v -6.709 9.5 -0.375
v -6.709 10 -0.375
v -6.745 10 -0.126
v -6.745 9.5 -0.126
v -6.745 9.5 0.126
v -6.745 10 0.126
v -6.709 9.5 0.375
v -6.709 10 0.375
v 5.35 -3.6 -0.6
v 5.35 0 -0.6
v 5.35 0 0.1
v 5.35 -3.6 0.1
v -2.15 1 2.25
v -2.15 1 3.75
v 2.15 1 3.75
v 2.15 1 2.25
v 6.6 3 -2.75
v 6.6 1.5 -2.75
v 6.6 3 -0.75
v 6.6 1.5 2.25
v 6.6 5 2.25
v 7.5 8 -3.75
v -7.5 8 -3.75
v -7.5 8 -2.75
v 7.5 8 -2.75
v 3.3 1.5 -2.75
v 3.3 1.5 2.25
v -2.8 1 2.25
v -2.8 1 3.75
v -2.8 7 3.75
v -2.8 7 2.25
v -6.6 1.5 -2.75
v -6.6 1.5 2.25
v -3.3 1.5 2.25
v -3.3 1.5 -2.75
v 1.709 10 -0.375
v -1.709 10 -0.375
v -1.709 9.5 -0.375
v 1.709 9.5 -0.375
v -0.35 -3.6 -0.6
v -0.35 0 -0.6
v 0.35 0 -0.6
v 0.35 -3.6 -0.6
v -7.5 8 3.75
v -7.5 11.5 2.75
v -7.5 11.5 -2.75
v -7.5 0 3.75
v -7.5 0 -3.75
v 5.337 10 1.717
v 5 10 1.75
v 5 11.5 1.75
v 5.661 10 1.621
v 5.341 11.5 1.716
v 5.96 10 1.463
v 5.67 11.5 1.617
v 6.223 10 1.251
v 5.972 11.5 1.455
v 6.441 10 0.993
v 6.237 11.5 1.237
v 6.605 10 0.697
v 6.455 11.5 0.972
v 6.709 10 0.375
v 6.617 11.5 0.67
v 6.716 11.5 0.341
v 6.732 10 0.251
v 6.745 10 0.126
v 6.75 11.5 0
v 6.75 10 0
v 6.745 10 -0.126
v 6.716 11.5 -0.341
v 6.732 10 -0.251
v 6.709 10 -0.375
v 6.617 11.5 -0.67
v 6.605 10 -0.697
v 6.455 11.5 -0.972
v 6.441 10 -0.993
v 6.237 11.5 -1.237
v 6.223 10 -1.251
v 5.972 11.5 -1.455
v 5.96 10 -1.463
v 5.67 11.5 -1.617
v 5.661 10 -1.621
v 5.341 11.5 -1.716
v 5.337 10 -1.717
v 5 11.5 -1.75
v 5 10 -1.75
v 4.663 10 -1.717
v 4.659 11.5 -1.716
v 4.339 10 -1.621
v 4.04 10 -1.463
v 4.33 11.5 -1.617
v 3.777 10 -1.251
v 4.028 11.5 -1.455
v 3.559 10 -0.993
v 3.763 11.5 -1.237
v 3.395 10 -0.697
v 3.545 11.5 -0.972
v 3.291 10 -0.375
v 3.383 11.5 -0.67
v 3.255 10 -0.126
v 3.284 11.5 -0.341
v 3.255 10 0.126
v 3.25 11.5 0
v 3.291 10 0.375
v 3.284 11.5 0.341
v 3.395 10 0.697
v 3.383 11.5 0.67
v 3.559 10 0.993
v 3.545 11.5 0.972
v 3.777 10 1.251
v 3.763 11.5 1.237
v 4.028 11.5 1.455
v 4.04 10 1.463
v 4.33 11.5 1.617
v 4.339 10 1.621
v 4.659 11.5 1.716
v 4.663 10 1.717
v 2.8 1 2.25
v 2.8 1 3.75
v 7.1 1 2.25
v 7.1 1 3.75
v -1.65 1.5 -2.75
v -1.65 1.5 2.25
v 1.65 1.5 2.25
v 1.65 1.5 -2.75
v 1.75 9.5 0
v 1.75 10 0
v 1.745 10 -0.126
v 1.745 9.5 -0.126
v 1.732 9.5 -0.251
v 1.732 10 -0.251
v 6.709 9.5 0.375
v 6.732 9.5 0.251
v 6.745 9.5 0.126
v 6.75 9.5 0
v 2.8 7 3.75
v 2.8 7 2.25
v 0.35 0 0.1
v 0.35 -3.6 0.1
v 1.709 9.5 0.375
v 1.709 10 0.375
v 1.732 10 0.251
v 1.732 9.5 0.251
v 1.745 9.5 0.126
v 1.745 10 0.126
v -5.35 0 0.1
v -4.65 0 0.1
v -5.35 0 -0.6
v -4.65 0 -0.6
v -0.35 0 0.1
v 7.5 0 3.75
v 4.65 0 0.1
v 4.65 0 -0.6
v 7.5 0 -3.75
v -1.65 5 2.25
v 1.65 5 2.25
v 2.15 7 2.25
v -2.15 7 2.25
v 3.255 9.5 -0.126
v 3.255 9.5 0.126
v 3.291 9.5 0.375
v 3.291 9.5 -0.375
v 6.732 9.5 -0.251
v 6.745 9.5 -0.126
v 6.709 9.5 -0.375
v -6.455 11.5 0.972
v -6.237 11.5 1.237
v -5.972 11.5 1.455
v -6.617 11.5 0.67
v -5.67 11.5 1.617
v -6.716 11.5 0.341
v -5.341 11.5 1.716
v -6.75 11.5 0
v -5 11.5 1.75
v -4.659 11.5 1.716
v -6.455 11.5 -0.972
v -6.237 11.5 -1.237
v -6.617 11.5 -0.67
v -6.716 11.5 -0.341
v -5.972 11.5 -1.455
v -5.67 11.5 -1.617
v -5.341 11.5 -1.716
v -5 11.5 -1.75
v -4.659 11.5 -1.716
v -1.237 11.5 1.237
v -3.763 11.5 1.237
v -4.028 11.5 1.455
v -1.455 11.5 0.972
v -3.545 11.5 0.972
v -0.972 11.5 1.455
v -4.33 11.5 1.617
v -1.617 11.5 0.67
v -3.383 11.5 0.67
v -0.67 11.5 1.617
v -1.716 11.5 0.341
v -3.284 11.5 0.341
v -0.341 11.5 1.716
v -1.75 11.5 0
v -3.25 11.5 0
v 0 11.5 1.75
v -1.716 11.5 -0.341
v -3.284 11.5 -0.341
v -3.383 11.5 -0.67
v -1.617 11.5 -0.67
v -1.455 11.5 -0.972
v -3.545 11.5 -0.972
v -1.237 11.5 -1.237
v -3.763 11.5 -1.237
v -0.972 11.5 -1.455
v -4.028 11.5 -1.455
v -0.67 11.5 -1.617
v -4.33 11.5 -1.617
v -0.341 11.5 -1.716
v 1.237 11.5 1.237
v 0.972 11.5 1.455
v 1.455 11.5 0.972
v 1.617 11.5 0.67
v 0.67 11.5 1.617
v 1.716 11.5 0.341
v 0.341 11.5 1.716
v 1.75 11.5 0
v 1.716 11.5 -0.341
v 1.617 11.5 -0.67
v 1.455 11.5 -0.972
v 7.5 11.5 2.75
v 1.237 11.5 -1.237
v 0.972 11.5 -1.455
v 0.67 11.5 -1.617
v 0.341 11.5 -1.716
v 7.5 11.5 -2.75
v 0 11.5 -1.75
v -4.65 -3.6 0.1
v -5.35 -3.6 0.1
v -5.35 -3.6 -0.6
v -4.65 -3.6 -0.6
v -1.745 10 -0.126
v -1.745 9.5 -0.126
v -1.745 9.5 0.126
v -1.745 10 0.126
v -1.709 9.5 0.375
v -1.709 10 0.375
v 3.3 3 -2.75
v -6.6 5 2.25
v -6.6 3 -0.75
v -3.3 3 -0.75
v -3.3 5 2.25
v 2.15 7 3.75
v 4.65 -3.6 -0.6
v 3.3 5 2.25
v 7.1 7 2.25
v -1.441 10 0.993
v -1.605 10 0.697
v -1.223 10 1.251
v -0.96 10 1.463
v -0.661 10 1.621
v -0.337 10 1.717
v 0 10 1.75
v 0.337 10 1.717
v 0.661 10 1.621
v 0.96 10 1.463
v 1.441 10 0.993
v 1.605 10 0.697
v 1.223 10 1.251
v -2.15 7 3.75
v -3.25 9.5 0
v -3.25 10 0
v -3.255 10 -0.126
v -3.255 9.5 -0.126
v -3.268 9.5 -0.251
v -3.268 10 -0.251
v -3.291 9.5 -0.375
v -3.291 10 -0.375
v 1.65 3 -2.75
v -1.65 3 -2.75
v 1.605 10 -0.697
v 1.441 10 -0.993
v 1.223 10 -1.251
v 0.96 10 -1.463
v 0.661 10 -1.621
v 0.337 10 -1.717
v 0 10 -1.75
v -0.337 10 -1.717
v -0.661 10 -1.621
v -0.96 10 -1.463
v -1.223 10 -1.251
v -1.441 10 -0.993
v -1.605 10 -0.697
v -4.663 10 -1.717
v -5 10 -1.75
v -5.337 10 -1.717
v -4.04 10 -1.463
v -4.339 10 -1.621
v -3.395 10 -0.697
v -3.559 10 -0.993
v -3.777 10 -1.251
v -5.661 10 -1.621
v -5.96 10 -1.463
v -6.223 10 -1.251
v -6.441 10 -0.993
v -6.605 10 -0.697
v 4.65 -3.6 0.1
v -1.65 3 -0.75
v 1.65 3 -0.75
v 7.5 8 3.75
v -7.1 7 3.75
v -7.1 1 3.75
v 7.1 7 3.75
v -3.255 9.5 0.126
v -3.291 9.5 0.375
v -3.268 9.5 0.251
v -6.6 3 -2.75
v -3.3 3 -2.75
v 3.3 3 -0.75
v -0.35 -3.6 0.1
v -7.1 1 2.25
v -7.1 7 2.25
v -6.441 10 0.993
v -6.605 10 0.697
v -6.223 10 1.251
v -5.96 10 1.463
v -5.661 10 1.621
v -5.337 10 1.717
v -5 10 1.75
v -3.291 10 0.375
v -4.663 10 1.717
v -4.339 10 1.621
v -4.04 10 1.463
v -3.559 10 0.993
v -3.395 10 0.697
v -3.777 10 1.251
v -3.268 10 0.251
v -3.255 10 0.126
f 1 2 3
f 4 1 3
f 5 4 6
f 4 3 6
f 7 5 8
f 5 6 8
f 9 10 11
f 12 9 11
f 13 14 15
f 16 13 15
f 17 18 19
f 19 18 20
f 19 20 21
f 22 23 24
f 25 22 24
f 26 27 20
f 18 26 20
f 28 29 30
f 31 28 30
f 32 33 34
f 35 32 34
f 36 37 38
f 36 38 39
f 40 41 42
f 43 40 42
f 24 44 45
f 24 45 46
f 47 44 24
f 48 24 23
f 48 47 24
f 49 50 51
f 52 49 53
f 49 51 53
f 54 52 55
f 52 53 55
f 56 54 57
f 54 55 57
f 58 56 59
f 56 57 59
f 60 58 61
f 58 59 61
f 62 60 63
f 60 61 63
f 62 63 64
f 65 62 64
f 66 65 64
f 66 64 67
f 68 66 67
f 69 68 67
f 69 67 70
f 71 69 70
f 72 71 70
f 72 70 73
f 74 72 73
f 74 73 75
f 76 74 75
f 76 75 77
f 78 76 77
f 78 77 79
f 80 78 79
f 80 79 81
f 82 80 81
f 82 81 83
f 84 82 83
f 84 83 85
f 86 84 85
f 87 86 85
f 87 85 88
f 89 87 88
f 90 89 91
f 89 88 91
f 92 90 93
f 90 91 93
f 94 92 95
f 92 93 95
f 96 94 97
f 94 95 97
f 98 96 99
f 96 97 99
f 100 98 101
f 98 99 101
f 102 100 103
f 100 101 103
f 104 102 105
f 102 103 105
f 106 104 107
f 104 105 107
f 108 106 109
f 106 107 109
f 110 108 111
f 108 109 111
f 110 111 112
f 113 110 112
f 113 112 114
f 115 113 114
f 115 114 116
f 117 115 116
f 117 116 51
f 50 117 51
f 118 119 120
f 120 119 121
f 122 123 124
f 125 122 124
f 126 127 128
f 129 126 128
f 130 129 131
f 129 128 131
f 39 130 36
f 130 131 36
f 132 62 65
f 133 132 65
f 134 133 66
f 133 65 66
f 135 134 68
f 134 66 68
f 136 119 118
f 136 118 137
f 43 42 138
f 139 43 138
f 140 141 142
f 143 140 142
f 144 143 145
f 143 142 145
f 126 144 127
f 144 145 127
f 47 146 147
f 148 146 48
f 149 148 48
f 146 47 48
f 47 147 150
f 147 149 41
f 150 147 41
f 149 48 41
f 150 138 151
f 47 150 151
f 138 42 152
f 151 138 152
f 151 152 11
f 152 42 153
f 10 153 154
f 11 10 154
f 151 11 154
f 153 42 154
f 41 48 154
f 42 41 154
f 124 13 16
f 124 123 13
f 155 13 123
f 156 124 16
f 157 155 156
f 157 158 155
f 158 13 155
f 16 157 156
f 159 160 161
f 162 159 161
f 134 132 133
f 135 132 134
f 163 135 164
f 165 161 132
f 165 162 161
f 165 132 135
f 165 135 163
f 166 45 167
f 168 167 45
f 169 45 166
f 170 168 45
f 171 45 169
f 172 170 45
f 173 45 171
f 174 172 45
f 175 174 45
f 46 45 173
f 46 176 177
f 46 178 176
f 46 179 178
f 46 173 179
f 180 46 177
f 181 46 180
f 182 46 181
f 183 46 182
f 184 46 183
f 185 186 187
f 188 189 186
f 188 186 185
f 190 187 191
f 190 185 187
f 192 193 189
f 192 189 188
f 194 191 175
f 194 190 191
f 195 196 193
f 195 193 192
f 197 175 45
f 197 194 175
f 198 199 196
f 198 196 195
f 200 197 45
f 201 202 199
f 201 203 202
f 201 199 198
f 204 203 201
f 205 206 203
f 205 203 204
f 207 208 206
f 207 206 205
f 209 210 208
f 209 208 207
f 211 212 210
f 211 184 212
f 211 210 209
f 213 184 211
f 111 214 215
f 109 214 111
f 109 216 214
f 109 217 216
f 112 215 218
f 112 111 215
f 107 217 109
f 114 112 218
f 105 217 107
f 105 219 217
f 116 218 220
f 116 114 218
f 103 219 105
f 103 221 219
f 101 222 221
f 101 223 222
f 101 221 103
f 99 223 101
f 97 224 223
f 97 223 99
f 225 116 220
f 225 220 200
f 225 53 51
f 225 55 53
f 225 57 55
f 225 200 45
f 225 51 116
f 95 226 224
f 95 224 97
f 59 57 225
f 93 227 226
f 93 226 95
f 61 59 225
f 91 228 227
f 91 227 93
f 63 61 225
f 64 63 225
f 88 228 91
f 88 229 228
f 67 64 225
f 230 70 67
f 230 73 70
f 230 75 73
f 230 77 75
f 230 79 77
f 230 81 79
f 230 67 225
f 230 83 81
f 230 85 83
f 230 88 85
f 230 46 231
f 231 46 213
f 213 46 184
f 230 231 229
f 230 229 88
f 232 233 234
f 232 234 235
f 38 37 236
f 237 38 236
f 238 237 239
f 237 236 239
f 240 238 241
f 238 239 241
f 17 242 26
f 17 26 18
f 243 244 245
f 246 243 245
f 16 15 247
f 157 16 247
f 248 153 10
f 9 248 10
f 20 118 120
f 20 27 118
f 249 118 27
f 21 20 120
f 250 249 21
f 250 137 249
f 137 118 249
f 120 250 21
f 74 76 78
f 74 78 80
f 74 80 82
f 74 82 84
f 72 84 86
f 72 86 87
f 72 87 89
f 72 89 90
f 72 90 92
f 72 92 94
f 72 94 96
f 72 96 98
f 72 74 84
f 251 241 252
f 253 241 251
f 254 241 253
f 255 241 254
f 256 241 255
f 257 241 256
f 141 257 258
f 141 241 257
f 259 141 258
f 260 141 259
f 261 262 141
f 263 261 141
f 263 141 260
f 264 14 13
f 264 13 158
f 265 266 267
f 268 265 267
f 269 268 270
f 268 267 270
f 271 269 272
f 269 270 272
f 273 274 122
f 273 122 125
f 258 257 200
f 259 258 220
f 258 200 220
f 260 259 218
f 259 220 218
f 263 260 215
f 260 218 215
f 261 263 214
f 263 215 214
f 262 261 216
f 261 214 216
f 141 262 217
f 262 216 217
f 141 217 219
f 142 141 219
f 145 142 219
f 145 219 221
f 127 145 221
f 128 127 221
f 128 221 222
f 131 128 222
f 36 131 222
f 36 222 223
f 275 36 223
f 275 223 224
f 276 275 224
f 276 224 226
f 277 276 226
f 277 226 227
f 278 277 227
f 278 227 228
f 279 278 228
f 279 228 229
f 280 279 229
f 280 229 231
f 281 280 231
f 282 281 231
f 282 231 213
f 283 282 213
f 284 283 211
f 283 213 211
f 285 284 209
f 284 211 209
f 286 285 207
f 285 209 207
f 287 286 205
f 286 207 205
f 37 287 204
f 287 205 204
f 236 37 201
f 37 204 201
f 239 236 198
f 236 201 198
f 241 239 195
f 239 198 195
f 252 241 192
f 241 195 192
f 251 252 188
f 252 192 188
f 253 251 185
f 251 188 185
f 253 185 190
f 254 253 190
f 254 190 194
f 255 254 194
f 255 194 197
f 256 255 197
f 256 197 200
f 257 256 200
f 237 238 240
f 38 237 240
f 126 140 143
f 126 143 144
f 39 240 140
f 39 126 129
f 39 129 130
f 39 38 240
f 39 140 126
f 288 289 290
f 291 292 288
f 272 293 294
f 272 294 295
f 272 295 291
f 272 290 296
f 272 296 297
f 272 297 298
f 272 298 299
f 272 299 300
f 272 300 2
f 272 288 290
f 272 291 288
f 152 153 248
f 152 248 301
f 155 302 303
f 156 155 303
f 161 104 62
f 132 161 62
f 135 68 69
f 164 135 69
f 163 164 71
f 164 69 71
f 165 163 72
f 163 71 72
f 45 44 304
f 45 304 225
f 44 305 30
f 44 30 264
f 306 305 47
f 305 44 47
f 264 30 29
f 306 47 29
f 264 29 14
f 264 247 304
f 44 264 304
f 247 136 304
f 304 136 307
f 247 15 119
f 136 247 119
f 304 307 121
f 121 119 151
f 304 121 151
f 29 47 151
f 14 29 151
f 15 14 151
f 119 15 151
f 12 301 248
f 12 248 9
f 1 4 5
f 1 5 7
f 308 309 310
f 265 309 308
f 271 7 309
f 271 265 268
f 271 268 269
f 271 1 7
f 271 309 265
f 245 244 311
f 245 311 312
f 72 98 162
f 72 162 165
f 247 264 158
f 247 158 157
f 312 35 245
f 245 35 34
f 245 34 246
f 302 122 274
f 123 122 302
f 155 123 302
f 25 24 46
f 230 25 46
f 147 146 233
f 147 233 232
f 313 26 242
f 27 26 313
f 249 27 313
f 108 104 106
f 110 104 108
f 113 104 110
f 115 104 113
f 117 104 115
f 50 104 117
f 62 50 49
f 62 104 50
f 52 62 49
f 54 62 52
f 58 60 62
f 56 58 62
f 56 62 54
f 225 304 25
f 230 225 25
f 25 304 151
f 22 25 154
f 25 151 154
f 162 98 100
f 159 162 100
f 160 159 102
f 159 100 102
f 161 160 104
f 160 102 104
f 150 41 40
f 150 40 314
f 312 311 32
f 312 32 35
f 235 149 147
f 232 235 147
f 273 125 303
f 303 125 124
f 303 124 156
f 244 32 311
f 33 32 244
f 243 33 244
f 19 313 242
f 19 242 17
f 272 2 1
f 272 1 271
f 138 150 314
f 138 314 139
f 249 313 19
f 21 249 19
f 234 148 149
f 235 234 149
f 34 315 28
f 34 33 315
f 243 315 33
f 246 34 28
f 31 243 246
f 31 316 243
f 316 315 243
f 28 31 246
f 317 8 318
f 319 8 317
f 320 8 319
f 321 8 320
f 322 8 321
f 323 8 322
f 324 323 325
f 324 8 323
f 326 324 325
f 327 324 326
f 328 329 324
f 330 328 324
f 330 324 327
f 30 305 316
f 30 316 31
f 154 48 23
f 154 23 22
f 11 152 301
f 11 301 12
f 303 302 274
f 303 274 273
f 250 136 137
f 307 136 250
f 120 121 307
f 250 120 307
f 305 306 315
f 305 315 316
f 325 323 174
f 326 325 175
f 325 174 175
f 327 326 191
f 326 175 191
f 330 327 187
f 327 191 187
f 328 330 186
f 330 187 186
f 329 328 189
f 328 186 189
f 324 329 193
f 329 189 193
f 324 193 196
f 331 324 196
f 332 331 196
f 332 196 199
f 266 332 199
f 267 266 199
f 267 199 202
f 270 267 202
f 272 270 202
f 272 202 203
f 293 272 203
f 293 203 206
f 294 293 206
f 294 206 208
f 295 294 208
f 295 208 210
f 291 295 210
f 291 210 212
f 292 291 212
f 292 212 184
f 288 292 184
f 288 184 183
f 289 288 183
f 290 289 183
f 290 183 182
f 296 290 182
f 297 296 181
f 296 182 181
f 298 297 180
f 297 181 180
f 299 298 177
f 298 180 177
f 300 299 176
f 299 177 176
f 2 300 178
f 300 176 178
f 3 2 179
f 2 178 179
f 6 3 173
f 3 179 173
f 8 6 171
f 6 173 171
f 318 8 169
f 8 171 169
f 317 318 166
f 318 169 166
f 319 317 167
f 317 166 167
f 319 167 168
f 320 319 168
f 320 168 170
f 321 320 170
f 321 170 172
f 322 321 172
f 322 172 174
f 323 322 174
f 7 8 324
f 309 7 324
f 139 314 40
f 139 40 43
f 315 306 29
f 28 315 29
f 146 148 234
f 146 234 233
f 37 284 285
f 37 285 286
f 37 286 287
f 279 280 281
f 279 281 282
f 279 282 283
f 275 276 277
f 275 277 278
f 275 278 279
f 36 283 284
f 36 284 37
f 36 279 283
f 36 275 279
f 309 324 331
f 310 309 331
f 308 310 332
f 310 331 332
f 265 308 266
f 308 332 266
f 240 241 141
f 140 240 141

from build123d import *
from OCP.BRepFilletAPI import BRepFilletAPI_MakeChamfer

# Parameters (mm, degrees)
SKETCH1_W           = 15
SKETCH1_H           = 7.5
BOSS_EXTRUDE1_DEPTH = 11.5
SKETCH2_W           = 1
SKETCH2_H           = 3.5
CUT_EXTRUDE1_DEPTH  = 20.269470673
CUT_EXTRUDE2_DEPTH  = 20.269470673
SKETCH4_R           = 1.75
CUT_EXTRUDE3_DEPTH  = 1.5
SKETCH5_W           = 3.418698582
SKETCH5_H           = 0.75
CUT_EXTRUDE4_DEPTH  = 0.5
SKETCH6_W           = 4.3
SKETCH6_H           = 6
CUT_EXTRUDE5_DEPTH  = 1.5
SKETCH7_W           = 3.3
SKETCH7_H           = 1.5
CUT_EXTRUDE6_DEPTH  = 5
CHAMFER1_SIZE       = 2
CHAMFER1_SIZE2      = 3
SKETCH8_W           = 0.7
SKETCH8_H           = 0.7
BOSS_EXTRUDE2_DEPTH = 3.6


with BuildPart() as part:
    # Sketch1 → Boss-Extrude1 (new body)
    with BuildSketch(Plane(origin=(0, 0, 0), x_dir=(1, 0, 0), z_dir=(0, 1, 0))):
        Rectangle(SKETCH1_W, SKETCH1_H)
    extrude(amount=BOSS_EXTRUDE1_DEPTH)

    # Sketch2 → Cut-Extrude1 (cut, through all)
    with BuildSketch(Plane.ZY.offset(7.5)):
        with Locations((-3.25, 9.75)):
            Rectangle(SKETCH2_W, SKETCH2_H)
    extrude(amount=-CUT_EXTRUDE1_DEPTH, mode=Mode.SUBTRACT)

    # Sketch3 → Cut-Extrude2 (cut, through all)
    with BuildSketch(Plane.ZY.offset(7.5)):
        Polygon((3.75, 8), (2.75, 11.5), (3.75, 11.5), align=None)
    extrude(amount=-CUT_EXTRUDE2_DEPTH, mode=Mode.SUBTRACT)

    # Sketch4 → Cut-Extrude3 (cut)
    with BuildSketch(Plane(origin=(0, 11.5, 0), x_dir=(1, 0, 0), z_dir=(0, 1, 0))):
        with Locations(Location((-5, 0, 0), (0, 0, 270))):
            Circle(SKETCH4_R)
        with Locations(Location((0, 0, 0), (0, 0, 270))):
            Circle(SKETCH4_R)
        with Locations(Location((5, 0, 0), (0, 0, 270))):
            Circle(SKETCH4_R)
    extrude(amount=-CUT_EXTRUDE3_DEPTH, mode=Mode.SUBTRACT)

    # Sketch5 → Cut-Extrude4 (cut)
    with BuildSketch(Plane(origin=(0, 10, 0), x_dir=(1, 0, 0), z_dir=(0, 1, 0))):
        with Locations((-5, 0)):
            Rectangle(SKETCH5_W, SKETCH5_H)
        with BuildLine():
            Line((-6.709349291, -0.375), (-6.709349291, 0.375))
            ThreePointArc((-6.709349291, 0.375), (-6.75, 0), (-6.709349291, -0.375))
        make_face()
        with BuildLine():
            ThreePointArc((-3.25, 0), (-3.260192358, 0.188598436), (-3.290650709, 0.375))
            Line((-3.290650709, 0.375), (-3.290650709, -0.375))
            ThreePointArc((-3.290650709, -0.375), (-3.260192358, -0.188598436), (-3.25, 0))
        make_face()
        Rectangle(SKETCH5_W, SKETCH5_H)
        with BuildLine():
            ThreePointArc((1.75, 0), (1.739807642, 0.188598436), (1.709349291, 0.375))
            Line((1.709349291, 0.375), (1.709349291, -0.375))
            ThreePointArc((1.709349291, -0.375), (1.739807642, -0.188598436), (1.75, 0))
        make_face()
        with Locations((5, 0)):
            Rectangle(SKETCH5_W, SKETCH5_H)
        with BuildLine():
            ThreePointArc((6.75, 0), (6.739807642, 0.188598436), (6.709349291, 0.375))
            Line((6.709349291, 0.375), (6.709349291, -0.375))
            ThreePointArc((6.709349291, -0.375), (6.739807642, -0.188598436), (6.75, 0))
        make_face()
        with BuildLine():
            Line((3.290650709, -0.375), (3.290650709, 0.375))
            ThreePointArc((3.290650709, 0.375), (3.25, 0), (3.290650709, -0.375))
        make_face()
        with BuildLine():
            Line((-1.709349291, -0.375), (-1.709349291, 0.375))
            ThreePointArc((-1.709349291, 0.375), (-1.75, 0), (-1.709349291, -0.375))
        make_face()
    extrude(amount=-CUT_EXTRUDE4_DEPTH, mode=Mode.SUBTRACT)

    # Sketch6 → Cut-Extrude5 (cut)
    with BuildSketch(Plane.XY.offset(3.75)):
        with Locations((-4.95, 4)):
            Rectangle(SKETCH6_W, SKETCH6_H)
        with Locations((0, 4)):
            Rectangle(SKETCH6_W, SKETCH6_H)
        with Locations((4.95, 4)):
            Rectangle(SKETCH6_W, SKETCH6_H)
    extrude(amount=-CUT_EXTRUDE5_DEPTH, mode=Mode.SUBTRACT)

    # Sketch7 → Cut-Extrude6 (cut)
    with BuildSketch(Plane.XY.offset(2.25)):
        with Locations((-4.95, 2.25)):
            Rectangle(SKETCH7_W, SKETCH7_H)
        with Locations((0, 2.25)):
            Rectangle(SKETCH7_W, SKETCH7_H)
        with Locations((4.95, 2.25)):
            Rectangle(SKETCH7_W, SKETCH7_H)
    extrude(amount=-CUT_EXTRUDE6_DEPTH, mode=Mode.SUBTRACT)

    # Chamfer1: one chamfer whose edges measure the first distance from different faces: ONE call of the kernel's chamfer builder (chamfer() names one face for all edges)
    chamfer1_edges_1 = [part.edges().sort_by_distance(p)[0] for p in [
        (-4.95, 3, 2.25),
    ]]
    chamfer1_side_1 = [part.faces().sort_by_distance(p)[0] for p in [
        (-4.95, 4.415467626, 2.25),
    ]]
    chamfer1_edges_2 = [part.edges().sort_by_distance(p)[0] for p in [
        (0, 3, 2.25),
    ]]
    chamfer1_side_2 = [part.faces().sort_by_distance(p)[0] for p in [
        (0, 4.415467626, 2.25),
    ]]
    chamfer1_edges_3 = [part.edges().sort_by_distance(p)[0] for p in [
        (4.95, 3, 2.25),
    ]]
    chamfer1_side_3 = [part.faces().sort_by_distance(p)[0] for p in [
        (4.95, 4.415467626, 2.25),
    ]]
    chamfer1 = BRepFilletAPI_MakeChamfer(part.part.solid().wrapped)
    for e in chamfer1_edges_1:
        chamfer1.Add(CHAMFER1_SIZE, CHAMFER1_SIZE2, e.wrapped, chamfer1_side_1[0].wrapped)  # the first distance lies on this face
    for e in chamfer1_edges_2:
        chamfer1.Add(CHAMFER1_SIZE, CHAMFER1_SIZE2, e.wrapped, chamfer1_side_2[0].wrapped)  # the first distance lies on this face
    for e in chamfer1_edges_3:
        chamfer1.Add(CHAMFER1_SIZE, CHAMFER1_SIZE2, e.wrapped, chamfer1_side_3[0].wrapped)  # the first distance lies on this face
    add(Compound.cast(chamfer1.Shape()), mode=Mode.REPLACE)

    # Sketch8 → Boss-Extrude2 (add)
    with BuildSketch(Plane.XZ):
        with Locations((-5, -0.25)):
            Rectangle(SKETCH8_W, SKETCH8_H)
        with Locations((0, -0.25)):
            Rectangle(SKETCH8_W, SKETCH8_H)
        with Locations((5, -0.25)):
            Rectangle(SKETCH8_W, SKETCH8_H)
    extrude(amount=BOSS_EXTRUDE2_DEPTH)


solid = part.part
